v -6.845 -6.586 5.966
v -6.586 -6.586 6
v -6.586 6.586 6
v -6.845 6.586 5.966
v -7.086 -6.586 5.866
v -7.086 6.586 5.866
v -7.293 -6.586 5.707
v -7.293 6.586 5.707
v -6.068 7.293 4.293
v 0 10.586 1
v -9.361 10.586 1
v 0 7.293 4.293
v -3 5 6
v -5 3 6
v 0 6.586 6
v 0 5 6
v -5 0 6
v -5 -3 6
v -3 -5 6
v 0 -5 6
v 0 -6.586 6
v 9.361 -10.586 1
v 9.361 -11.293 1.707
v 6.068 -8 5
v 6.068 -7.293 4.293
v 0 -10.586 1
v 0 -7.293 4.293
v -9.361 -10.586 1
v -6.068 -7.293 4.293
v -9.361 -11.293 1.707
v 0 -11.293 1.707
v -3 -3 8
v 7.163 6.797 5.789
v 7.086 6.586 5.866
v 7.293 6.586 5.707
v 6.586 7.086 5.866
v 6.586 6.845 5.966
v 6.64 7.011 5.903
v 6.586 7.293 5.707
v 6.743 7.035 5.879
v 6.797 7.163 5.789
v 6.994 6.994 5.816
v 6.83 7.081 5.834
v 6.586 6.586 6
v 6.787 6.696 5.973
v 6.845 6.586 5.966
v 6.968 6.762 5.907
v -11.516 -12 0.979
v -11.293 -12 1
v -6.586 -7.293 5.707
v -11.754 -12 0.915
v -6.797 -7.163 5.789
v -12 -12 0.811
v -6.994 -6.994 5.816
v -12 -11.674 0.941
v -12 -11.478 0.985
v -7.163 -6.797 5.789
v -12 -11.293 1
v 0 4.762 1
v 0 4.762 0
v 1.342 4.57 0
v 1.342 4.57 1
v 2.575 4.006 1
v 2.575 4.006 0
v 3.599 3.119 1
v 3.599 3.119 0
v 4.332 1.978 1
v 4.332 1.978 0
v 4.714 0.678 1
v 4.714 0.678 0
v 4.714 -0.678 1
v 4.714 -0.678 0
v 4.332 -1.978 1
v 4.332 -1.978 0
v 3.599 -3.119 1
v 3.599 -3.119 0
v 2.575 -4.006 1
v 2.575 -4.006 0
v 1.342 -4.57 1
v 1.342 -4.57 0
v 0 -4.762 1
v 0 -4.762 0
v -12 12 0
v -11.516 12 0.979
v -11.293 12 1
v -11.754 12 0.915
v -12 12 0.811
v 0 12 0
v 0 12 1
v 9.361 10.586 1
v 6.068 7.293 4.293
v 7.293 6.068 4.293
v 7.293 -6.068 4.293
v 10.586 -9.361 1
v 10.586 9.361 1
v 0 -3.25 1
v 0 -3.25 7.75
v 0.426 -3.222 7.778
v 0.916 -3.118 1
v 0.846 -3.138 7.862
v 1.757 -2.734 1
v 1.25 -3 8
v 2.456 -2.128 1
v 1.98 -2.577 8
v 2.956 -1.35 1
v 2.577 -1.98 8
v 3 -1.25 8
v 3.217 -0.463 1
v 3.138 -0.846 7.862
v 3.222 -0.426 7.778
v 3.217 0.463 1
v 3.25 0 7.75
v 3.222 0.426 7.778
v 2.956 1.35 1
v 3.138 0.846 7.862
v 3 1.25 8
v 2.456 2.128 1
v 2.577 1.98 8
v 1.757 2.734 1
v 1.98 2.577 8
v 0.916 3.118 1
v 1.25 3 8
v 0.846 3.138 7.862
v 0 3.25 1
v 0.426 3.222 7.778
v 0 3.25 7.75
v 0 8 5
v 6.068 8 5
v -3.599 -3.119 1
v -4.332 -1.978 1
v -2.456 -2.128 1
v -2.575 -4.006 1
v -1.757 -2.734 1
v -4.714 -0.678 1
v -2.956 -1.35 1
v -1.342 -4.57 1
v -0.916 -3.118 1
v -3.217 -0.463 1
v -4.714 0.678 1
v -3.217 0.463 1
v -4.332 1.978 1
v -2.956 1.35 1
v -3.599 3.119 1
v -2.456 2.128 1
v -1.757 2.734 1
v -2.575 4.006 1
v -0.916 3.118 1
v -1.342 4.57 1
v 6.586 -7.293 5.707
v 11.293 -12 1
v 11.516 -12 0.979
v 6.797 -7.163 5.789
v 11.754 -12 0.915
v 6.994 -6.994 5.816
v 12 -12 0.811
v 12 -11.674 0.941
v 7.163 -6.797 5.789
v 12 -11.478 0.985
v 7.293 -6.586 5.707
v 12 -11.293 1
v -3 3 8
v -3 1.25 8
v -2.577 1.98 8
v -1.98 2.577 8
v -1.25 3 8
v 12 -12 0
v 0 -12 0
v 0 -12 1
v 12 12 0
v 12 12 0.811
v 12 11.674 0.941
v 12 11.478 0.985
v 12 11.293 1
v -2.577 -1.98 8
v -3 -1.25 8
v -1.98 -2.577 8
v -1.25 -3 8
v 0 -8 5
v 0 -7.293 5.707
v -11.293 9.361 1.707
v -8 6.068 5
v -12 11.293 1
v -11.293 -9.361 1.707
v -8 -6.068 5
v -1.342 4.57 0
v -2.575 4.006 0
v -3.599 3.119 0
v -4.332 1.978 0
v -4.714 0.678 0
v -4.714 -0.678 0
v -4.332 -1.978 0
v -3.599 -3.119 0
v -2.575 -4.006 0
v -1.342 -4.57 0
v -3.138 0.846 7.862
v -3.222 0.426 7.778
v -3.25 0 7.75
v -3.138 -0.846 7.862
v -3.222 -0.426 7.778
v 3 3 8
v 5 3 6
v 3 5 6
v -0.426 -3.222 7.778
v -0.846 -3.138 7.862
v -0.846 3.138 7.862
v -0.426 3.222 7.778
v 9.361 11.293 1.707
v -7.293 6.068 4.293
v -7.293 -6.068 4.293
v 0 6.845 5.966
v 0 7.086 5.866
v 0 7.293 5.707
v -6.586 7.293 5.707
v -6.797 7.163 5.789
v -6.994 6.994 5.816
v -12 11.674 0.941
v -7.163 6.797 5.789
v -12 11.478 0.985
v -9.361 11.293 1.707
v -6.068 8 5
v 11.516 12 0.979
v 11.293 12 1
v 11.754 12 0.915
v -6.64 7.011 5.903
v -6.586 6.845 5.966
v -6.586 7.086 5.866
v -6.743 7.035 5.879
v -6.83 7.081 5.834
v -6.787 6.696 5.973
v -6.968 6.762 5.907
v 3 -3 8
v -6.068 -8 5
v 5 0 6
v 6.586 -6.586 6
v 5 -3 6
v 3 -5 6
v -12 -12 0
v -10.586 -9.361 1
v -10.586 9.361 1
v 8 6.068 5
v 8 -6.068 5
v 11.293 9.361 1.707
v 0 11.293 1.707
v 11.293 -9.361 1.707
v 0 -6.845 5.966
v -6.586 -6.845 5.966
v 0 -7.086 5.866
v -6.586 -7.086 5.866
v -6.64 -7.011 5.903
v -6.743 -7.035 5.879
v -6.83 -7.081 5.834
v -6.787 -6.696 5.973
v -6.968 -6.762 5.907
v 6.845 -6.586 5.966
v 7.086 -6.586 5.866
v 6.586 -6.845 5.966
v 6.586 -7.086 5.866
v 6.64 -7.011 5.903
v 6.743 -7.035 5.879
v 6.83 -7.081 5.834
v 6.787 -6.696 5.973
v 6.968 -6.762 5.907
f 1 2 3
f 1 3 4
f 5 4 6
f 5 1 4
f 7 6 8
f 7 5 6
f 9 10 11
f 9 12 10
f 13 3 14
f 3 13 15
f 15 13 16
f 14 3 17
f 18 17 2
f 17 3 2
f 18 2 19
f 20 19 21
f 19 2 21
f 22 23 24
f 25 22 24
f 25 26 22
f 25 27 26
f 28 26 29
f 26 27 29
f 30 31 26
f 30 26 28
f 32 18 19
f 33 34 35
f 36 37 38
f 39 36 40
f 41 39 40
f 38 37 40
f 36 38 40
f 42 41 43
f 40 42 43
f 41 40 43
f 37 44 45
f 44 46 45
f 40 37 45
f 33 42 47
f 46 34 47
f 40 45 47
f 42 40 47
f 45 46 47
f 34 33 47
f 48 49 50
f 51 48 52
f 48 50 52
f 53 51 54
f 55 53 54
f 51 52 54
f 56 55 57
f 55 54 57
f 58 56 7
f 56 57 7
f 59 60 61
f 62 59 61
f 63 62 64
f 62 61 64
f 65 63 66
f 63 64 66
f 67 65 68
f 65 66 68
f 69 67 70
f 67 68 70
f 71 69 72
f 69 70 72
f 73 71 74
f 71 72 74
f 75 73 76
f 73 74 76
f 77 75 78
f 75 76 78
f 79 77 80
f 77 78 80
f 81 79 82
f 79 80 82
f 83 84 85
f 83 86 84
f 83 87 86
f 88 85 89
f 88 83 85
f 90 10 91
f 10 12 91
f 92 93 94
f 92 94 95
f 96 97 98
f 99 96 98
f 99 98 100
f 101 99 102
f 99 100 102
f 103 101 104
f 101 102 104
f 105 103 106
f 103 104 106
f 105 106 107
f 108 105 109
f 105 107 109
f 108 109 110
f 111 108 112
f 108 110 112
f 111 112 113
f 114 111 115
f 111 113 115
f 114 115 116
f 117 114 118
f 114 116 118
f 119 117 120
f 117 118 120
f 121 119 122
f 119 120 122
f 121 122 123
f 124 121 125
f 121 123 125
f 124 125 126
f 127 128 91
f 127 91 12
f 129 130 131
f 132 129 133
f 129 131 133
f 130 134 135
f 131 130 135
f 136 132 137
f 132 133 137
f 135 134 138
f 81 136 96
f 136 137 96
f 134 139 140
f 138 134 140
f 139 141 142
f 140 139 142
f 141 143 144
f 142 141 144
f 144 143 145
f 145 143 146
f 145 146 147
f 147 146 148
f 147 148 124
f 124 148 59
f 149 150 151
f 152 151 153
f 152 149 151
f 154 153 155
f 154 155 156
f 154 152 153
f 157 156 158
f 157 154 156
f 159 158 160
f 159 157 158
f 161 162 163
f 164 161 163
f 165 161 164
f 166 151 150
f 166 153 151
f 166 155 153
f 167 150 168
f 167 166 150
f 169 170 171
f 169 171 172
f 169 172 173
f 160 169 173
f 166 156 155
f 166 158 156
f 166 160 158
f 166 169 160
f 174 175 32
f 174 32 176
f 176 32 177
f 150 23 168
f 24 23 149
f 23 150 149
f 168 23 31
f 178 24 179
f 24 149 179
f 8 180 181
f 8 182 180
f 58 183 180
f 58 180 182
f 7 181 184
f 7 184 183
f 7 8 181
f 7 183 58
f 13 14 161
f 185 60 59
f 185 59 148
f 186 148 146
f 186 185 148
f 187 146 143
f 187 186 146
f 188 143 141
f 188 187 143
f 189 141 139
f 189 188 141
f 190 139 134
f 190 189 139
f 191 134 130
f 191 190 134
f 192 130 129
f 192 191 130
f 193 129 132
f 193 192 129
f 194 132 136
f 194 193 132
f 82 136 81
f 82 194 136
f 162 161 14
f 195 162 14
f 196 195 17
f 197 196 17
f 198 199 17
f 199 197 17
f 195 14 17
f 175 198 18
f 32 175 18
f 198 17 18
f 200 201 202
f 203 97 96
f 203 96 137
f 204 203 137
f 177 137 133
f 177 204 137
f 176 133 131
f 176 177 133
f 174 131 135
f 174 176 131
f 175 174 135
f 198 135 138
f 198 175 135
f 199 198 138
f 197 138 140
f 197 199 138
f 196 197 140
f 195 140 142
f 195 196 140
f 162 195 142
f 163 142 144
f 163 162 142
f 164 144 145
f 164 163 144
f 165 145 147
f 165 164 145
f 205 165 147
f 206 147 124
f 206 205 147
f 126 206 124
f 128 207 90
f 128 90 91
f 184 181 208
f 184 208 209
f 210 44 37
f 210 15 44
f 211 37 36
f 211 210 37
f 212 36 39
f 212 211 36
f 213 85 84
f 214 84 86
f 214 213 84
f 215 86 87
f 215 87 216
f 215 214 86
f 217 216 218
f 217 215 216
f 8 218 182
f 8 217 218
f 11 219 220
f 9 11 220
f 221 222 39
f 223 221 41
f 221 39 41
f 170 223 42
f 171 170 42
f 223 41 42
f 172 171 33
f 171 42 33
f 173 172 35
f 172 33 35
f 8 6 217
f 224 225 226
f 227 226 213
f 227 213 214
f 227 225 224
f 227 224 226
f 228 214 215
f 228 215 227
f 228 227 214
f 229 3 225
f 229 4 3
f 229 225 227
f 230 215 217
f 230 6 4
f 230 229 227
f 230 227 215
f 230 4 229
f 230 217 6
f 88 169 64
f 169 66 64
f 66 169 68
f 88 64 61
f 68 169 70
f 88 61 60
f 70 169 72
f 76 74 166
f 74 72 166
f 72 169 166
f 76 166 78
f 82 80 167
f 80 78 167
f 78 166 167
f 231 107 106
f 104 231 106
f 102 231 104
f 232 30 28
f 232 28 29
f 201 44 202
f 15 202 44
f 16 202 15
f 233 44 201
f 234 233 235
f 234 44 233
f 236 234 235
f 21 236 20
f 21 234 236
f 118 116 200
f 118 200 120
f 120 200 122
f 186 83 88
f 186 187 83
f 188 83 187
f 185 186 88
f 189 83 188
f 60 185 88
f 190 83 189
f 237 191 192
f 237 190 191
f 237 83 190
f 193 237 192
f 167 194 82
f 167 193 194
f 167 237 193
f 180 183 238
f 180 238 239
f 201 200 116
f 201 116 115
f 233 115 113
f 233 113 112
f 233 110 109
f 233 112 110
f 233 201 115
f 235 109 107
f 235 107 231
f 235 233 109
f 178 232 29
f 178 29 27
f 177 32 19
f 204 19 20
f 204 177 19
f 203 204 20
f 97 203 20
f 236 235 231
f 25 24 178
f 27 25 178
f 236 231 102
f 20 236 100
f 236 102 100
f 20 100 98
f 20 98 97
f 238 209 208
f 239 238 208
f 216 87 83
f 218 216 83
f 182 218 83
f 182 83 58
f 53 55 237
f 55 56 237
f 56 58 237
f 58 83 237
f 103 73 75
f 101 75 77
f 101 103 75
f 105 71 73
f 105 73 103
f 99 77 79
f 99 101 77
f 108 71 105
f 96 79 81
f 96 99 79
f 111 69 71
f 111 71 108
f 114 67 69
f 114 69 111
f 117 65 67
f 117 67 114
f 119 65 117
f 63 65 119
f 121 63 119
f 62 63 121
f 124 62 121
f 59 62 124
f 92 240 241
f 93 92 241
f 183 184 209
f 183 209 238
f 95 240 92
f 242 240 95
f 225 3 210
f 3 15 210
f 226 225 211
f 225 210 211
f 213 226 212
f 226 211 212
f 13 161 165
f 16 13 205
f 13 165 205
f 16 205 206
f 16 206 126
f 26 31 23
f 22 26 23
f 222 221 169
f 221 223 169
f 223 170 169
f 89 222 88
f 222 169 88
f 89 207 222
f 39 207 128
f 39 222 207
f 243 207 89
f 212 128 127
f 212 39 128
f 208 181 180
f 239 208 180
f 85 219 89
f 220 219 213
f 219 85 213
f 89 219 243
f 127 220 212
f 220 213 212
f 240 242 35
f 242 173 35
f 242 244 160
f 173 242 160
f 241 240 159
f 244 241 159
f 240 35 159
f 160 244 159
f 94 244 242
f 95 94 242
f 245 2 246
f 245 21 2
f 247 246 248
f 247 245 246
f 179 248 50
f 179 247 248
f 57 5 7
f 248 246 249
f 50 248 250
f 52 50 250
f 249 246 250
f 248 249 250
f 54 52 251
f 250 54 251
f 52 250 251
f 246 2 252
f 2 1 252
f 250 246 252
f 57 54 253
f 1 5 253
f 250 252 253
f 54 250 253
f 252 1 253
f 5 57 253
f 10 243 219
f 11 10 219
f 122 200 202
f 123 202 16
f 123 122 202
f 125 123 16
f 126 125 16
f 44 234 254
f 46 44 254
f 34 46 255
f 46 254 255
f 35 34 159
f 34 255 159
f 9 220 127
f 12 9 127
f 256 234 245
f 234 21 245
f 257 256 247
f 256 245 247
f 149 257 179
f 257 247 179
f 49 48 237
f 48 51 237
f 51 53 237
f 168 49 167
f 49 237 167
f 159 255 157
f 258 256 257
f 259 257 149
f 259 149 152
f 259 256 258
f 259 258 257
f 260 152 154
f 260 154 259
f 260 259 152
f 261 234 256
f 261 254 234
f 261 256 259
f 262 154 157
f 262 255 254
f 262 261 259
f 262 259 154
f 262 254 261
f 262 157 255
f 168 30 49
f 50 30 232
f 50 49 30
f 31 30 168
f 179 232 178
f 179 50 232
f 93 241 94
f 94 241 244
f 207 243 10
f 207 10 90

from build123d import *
from build123d import SkipClean  # not in build123d's __all__

# Parameters (mm, degrees)
F0_W      = 12
F0_H      = 12
F1_DEPTH  = 6
F2_R      = 4.7625
F3_DEPTH  = 1
F4_W      = 5
F4_H      = 5
F5_DEPTH  = 2
F6_SIZE   = 5
F7_SIZE   = 1.99999
F8_R      = 1
F10_DEPTH = 1
F12_DEPTH = 1
F13_R     = 3.25
F14_DEPTH = 7


# Not quite as in the source:
# - a fillet or chamfer is up to 0.001 mm smaller than in the source, because OpenCascade refuses the exact size


with BuildPart() as f1:
    # F0 (on Top) → F1 (new body)
    with BuildSketch(Plane.XY):
        with Locations((-6, 6)):
            Rectangle(F0_W, F0_H)
    extrude(amount=F1_DEPTH)

    # F2 (on face) → F3 (cut)
    with BuildSketch(Plane(origin=(0, 0, 0), x_dir=(1, 0, 0), z_dir=(0, 0, -1))):
        Circle(F2_R)
    extrude(amount=-F3_DEPTH, mode=Mode.SUBTRACT)

    # F4 (on face) → F5 (join)
    with BuildSketch(Plane.XY.offset(6)):
        with Locations((-2.5, 2.5)):
            Rectangle(F4_W, F4_H)
    extrude(amount=F5_DEPTH)

    # F6
    f6_edges = [f1.edges().sort_by_distance(p)[0] for p in [
        (-12, 6, 6),
        (-6, 12, 6),
    ]]
    chamfer(f6_edges, length=F6_SIZE)

    # F7 (size 2 in the source; OpenCascade refuses exactly that, so slightly less here)
    f7_edges = [f1.edges().sort_by_distance(p)[0] for p in [
        (-5, 5, 7),
        (-5, 2.5, 8),
        (-2.5, 5, 8),
    ]]
    chamfer(f7_edges, length=F7_SIZE)

    # F8
    f8_edges = [f1.edges().sort_by_distance(p)[0] for p in [
        (-7, 3.5, 6),
        (-3.5, 7, 6),
        (-9.5, 9.5, 3.5),
    ]]
    fillet(f8_edges, radius=F8_R)

    # F9 (on face) → F10 (cut)
    with BuildSketch(Plane(origin=(0, 6.5, 6.5), x_dir=(-1, 0, 0), z_dir=(0, 0.7071067812, 0.7071067812))):
        Polygon((0, -6.7781745931), (9.3610415662, -6.7781745931), (6.0681483474, -2.1213203436), (0, -2.1213203436), align=None)
    extrude(amount=-F10_DEPTH, mode=Mode.SUBTRACT)

    # F11 (on face) → F12 (cut)
    with BuildSketch(Plane(origin=(-6.5, 0, 6.5), x_dir=(0, -1, 0), z_dir=(-0.7071067812, 0, 0.7071067812))):
        Polygon((0, -6.7781745931), (0, -2.1213203436), (-6.0681483474, -2.1213203436), (-9.3610415662, -6.7781745931), align=None)
    extrude(amount=-F12_DEPTH, mode=Mode.SUBTRACT)

    # F13 (on face) → F14 (cut, through all)
    with BuildSketch(Plane.XY.offset(8)):
        Circle(F13_R)
    extrude(amount=-F14_DEPTH, mode=Mode.SUBTRACT)

    # F15: F1 across plane


with BuildPart() as f1_1:
    add(f1.part, clean=False)
    add(f1.part.mirror(Plane.XZ), clean=False)

    # F16: F1 across plane


with BuildPart() as f1_2:
    add(f1_1.part, clean=False)
    with SkipClean():  # cleaning this boolean's faces spoils the solid; the shape is the same uncleaned
        add(f1_1.part.mirror(Plane.YZ), clean=False)


solid = f1_2.part
